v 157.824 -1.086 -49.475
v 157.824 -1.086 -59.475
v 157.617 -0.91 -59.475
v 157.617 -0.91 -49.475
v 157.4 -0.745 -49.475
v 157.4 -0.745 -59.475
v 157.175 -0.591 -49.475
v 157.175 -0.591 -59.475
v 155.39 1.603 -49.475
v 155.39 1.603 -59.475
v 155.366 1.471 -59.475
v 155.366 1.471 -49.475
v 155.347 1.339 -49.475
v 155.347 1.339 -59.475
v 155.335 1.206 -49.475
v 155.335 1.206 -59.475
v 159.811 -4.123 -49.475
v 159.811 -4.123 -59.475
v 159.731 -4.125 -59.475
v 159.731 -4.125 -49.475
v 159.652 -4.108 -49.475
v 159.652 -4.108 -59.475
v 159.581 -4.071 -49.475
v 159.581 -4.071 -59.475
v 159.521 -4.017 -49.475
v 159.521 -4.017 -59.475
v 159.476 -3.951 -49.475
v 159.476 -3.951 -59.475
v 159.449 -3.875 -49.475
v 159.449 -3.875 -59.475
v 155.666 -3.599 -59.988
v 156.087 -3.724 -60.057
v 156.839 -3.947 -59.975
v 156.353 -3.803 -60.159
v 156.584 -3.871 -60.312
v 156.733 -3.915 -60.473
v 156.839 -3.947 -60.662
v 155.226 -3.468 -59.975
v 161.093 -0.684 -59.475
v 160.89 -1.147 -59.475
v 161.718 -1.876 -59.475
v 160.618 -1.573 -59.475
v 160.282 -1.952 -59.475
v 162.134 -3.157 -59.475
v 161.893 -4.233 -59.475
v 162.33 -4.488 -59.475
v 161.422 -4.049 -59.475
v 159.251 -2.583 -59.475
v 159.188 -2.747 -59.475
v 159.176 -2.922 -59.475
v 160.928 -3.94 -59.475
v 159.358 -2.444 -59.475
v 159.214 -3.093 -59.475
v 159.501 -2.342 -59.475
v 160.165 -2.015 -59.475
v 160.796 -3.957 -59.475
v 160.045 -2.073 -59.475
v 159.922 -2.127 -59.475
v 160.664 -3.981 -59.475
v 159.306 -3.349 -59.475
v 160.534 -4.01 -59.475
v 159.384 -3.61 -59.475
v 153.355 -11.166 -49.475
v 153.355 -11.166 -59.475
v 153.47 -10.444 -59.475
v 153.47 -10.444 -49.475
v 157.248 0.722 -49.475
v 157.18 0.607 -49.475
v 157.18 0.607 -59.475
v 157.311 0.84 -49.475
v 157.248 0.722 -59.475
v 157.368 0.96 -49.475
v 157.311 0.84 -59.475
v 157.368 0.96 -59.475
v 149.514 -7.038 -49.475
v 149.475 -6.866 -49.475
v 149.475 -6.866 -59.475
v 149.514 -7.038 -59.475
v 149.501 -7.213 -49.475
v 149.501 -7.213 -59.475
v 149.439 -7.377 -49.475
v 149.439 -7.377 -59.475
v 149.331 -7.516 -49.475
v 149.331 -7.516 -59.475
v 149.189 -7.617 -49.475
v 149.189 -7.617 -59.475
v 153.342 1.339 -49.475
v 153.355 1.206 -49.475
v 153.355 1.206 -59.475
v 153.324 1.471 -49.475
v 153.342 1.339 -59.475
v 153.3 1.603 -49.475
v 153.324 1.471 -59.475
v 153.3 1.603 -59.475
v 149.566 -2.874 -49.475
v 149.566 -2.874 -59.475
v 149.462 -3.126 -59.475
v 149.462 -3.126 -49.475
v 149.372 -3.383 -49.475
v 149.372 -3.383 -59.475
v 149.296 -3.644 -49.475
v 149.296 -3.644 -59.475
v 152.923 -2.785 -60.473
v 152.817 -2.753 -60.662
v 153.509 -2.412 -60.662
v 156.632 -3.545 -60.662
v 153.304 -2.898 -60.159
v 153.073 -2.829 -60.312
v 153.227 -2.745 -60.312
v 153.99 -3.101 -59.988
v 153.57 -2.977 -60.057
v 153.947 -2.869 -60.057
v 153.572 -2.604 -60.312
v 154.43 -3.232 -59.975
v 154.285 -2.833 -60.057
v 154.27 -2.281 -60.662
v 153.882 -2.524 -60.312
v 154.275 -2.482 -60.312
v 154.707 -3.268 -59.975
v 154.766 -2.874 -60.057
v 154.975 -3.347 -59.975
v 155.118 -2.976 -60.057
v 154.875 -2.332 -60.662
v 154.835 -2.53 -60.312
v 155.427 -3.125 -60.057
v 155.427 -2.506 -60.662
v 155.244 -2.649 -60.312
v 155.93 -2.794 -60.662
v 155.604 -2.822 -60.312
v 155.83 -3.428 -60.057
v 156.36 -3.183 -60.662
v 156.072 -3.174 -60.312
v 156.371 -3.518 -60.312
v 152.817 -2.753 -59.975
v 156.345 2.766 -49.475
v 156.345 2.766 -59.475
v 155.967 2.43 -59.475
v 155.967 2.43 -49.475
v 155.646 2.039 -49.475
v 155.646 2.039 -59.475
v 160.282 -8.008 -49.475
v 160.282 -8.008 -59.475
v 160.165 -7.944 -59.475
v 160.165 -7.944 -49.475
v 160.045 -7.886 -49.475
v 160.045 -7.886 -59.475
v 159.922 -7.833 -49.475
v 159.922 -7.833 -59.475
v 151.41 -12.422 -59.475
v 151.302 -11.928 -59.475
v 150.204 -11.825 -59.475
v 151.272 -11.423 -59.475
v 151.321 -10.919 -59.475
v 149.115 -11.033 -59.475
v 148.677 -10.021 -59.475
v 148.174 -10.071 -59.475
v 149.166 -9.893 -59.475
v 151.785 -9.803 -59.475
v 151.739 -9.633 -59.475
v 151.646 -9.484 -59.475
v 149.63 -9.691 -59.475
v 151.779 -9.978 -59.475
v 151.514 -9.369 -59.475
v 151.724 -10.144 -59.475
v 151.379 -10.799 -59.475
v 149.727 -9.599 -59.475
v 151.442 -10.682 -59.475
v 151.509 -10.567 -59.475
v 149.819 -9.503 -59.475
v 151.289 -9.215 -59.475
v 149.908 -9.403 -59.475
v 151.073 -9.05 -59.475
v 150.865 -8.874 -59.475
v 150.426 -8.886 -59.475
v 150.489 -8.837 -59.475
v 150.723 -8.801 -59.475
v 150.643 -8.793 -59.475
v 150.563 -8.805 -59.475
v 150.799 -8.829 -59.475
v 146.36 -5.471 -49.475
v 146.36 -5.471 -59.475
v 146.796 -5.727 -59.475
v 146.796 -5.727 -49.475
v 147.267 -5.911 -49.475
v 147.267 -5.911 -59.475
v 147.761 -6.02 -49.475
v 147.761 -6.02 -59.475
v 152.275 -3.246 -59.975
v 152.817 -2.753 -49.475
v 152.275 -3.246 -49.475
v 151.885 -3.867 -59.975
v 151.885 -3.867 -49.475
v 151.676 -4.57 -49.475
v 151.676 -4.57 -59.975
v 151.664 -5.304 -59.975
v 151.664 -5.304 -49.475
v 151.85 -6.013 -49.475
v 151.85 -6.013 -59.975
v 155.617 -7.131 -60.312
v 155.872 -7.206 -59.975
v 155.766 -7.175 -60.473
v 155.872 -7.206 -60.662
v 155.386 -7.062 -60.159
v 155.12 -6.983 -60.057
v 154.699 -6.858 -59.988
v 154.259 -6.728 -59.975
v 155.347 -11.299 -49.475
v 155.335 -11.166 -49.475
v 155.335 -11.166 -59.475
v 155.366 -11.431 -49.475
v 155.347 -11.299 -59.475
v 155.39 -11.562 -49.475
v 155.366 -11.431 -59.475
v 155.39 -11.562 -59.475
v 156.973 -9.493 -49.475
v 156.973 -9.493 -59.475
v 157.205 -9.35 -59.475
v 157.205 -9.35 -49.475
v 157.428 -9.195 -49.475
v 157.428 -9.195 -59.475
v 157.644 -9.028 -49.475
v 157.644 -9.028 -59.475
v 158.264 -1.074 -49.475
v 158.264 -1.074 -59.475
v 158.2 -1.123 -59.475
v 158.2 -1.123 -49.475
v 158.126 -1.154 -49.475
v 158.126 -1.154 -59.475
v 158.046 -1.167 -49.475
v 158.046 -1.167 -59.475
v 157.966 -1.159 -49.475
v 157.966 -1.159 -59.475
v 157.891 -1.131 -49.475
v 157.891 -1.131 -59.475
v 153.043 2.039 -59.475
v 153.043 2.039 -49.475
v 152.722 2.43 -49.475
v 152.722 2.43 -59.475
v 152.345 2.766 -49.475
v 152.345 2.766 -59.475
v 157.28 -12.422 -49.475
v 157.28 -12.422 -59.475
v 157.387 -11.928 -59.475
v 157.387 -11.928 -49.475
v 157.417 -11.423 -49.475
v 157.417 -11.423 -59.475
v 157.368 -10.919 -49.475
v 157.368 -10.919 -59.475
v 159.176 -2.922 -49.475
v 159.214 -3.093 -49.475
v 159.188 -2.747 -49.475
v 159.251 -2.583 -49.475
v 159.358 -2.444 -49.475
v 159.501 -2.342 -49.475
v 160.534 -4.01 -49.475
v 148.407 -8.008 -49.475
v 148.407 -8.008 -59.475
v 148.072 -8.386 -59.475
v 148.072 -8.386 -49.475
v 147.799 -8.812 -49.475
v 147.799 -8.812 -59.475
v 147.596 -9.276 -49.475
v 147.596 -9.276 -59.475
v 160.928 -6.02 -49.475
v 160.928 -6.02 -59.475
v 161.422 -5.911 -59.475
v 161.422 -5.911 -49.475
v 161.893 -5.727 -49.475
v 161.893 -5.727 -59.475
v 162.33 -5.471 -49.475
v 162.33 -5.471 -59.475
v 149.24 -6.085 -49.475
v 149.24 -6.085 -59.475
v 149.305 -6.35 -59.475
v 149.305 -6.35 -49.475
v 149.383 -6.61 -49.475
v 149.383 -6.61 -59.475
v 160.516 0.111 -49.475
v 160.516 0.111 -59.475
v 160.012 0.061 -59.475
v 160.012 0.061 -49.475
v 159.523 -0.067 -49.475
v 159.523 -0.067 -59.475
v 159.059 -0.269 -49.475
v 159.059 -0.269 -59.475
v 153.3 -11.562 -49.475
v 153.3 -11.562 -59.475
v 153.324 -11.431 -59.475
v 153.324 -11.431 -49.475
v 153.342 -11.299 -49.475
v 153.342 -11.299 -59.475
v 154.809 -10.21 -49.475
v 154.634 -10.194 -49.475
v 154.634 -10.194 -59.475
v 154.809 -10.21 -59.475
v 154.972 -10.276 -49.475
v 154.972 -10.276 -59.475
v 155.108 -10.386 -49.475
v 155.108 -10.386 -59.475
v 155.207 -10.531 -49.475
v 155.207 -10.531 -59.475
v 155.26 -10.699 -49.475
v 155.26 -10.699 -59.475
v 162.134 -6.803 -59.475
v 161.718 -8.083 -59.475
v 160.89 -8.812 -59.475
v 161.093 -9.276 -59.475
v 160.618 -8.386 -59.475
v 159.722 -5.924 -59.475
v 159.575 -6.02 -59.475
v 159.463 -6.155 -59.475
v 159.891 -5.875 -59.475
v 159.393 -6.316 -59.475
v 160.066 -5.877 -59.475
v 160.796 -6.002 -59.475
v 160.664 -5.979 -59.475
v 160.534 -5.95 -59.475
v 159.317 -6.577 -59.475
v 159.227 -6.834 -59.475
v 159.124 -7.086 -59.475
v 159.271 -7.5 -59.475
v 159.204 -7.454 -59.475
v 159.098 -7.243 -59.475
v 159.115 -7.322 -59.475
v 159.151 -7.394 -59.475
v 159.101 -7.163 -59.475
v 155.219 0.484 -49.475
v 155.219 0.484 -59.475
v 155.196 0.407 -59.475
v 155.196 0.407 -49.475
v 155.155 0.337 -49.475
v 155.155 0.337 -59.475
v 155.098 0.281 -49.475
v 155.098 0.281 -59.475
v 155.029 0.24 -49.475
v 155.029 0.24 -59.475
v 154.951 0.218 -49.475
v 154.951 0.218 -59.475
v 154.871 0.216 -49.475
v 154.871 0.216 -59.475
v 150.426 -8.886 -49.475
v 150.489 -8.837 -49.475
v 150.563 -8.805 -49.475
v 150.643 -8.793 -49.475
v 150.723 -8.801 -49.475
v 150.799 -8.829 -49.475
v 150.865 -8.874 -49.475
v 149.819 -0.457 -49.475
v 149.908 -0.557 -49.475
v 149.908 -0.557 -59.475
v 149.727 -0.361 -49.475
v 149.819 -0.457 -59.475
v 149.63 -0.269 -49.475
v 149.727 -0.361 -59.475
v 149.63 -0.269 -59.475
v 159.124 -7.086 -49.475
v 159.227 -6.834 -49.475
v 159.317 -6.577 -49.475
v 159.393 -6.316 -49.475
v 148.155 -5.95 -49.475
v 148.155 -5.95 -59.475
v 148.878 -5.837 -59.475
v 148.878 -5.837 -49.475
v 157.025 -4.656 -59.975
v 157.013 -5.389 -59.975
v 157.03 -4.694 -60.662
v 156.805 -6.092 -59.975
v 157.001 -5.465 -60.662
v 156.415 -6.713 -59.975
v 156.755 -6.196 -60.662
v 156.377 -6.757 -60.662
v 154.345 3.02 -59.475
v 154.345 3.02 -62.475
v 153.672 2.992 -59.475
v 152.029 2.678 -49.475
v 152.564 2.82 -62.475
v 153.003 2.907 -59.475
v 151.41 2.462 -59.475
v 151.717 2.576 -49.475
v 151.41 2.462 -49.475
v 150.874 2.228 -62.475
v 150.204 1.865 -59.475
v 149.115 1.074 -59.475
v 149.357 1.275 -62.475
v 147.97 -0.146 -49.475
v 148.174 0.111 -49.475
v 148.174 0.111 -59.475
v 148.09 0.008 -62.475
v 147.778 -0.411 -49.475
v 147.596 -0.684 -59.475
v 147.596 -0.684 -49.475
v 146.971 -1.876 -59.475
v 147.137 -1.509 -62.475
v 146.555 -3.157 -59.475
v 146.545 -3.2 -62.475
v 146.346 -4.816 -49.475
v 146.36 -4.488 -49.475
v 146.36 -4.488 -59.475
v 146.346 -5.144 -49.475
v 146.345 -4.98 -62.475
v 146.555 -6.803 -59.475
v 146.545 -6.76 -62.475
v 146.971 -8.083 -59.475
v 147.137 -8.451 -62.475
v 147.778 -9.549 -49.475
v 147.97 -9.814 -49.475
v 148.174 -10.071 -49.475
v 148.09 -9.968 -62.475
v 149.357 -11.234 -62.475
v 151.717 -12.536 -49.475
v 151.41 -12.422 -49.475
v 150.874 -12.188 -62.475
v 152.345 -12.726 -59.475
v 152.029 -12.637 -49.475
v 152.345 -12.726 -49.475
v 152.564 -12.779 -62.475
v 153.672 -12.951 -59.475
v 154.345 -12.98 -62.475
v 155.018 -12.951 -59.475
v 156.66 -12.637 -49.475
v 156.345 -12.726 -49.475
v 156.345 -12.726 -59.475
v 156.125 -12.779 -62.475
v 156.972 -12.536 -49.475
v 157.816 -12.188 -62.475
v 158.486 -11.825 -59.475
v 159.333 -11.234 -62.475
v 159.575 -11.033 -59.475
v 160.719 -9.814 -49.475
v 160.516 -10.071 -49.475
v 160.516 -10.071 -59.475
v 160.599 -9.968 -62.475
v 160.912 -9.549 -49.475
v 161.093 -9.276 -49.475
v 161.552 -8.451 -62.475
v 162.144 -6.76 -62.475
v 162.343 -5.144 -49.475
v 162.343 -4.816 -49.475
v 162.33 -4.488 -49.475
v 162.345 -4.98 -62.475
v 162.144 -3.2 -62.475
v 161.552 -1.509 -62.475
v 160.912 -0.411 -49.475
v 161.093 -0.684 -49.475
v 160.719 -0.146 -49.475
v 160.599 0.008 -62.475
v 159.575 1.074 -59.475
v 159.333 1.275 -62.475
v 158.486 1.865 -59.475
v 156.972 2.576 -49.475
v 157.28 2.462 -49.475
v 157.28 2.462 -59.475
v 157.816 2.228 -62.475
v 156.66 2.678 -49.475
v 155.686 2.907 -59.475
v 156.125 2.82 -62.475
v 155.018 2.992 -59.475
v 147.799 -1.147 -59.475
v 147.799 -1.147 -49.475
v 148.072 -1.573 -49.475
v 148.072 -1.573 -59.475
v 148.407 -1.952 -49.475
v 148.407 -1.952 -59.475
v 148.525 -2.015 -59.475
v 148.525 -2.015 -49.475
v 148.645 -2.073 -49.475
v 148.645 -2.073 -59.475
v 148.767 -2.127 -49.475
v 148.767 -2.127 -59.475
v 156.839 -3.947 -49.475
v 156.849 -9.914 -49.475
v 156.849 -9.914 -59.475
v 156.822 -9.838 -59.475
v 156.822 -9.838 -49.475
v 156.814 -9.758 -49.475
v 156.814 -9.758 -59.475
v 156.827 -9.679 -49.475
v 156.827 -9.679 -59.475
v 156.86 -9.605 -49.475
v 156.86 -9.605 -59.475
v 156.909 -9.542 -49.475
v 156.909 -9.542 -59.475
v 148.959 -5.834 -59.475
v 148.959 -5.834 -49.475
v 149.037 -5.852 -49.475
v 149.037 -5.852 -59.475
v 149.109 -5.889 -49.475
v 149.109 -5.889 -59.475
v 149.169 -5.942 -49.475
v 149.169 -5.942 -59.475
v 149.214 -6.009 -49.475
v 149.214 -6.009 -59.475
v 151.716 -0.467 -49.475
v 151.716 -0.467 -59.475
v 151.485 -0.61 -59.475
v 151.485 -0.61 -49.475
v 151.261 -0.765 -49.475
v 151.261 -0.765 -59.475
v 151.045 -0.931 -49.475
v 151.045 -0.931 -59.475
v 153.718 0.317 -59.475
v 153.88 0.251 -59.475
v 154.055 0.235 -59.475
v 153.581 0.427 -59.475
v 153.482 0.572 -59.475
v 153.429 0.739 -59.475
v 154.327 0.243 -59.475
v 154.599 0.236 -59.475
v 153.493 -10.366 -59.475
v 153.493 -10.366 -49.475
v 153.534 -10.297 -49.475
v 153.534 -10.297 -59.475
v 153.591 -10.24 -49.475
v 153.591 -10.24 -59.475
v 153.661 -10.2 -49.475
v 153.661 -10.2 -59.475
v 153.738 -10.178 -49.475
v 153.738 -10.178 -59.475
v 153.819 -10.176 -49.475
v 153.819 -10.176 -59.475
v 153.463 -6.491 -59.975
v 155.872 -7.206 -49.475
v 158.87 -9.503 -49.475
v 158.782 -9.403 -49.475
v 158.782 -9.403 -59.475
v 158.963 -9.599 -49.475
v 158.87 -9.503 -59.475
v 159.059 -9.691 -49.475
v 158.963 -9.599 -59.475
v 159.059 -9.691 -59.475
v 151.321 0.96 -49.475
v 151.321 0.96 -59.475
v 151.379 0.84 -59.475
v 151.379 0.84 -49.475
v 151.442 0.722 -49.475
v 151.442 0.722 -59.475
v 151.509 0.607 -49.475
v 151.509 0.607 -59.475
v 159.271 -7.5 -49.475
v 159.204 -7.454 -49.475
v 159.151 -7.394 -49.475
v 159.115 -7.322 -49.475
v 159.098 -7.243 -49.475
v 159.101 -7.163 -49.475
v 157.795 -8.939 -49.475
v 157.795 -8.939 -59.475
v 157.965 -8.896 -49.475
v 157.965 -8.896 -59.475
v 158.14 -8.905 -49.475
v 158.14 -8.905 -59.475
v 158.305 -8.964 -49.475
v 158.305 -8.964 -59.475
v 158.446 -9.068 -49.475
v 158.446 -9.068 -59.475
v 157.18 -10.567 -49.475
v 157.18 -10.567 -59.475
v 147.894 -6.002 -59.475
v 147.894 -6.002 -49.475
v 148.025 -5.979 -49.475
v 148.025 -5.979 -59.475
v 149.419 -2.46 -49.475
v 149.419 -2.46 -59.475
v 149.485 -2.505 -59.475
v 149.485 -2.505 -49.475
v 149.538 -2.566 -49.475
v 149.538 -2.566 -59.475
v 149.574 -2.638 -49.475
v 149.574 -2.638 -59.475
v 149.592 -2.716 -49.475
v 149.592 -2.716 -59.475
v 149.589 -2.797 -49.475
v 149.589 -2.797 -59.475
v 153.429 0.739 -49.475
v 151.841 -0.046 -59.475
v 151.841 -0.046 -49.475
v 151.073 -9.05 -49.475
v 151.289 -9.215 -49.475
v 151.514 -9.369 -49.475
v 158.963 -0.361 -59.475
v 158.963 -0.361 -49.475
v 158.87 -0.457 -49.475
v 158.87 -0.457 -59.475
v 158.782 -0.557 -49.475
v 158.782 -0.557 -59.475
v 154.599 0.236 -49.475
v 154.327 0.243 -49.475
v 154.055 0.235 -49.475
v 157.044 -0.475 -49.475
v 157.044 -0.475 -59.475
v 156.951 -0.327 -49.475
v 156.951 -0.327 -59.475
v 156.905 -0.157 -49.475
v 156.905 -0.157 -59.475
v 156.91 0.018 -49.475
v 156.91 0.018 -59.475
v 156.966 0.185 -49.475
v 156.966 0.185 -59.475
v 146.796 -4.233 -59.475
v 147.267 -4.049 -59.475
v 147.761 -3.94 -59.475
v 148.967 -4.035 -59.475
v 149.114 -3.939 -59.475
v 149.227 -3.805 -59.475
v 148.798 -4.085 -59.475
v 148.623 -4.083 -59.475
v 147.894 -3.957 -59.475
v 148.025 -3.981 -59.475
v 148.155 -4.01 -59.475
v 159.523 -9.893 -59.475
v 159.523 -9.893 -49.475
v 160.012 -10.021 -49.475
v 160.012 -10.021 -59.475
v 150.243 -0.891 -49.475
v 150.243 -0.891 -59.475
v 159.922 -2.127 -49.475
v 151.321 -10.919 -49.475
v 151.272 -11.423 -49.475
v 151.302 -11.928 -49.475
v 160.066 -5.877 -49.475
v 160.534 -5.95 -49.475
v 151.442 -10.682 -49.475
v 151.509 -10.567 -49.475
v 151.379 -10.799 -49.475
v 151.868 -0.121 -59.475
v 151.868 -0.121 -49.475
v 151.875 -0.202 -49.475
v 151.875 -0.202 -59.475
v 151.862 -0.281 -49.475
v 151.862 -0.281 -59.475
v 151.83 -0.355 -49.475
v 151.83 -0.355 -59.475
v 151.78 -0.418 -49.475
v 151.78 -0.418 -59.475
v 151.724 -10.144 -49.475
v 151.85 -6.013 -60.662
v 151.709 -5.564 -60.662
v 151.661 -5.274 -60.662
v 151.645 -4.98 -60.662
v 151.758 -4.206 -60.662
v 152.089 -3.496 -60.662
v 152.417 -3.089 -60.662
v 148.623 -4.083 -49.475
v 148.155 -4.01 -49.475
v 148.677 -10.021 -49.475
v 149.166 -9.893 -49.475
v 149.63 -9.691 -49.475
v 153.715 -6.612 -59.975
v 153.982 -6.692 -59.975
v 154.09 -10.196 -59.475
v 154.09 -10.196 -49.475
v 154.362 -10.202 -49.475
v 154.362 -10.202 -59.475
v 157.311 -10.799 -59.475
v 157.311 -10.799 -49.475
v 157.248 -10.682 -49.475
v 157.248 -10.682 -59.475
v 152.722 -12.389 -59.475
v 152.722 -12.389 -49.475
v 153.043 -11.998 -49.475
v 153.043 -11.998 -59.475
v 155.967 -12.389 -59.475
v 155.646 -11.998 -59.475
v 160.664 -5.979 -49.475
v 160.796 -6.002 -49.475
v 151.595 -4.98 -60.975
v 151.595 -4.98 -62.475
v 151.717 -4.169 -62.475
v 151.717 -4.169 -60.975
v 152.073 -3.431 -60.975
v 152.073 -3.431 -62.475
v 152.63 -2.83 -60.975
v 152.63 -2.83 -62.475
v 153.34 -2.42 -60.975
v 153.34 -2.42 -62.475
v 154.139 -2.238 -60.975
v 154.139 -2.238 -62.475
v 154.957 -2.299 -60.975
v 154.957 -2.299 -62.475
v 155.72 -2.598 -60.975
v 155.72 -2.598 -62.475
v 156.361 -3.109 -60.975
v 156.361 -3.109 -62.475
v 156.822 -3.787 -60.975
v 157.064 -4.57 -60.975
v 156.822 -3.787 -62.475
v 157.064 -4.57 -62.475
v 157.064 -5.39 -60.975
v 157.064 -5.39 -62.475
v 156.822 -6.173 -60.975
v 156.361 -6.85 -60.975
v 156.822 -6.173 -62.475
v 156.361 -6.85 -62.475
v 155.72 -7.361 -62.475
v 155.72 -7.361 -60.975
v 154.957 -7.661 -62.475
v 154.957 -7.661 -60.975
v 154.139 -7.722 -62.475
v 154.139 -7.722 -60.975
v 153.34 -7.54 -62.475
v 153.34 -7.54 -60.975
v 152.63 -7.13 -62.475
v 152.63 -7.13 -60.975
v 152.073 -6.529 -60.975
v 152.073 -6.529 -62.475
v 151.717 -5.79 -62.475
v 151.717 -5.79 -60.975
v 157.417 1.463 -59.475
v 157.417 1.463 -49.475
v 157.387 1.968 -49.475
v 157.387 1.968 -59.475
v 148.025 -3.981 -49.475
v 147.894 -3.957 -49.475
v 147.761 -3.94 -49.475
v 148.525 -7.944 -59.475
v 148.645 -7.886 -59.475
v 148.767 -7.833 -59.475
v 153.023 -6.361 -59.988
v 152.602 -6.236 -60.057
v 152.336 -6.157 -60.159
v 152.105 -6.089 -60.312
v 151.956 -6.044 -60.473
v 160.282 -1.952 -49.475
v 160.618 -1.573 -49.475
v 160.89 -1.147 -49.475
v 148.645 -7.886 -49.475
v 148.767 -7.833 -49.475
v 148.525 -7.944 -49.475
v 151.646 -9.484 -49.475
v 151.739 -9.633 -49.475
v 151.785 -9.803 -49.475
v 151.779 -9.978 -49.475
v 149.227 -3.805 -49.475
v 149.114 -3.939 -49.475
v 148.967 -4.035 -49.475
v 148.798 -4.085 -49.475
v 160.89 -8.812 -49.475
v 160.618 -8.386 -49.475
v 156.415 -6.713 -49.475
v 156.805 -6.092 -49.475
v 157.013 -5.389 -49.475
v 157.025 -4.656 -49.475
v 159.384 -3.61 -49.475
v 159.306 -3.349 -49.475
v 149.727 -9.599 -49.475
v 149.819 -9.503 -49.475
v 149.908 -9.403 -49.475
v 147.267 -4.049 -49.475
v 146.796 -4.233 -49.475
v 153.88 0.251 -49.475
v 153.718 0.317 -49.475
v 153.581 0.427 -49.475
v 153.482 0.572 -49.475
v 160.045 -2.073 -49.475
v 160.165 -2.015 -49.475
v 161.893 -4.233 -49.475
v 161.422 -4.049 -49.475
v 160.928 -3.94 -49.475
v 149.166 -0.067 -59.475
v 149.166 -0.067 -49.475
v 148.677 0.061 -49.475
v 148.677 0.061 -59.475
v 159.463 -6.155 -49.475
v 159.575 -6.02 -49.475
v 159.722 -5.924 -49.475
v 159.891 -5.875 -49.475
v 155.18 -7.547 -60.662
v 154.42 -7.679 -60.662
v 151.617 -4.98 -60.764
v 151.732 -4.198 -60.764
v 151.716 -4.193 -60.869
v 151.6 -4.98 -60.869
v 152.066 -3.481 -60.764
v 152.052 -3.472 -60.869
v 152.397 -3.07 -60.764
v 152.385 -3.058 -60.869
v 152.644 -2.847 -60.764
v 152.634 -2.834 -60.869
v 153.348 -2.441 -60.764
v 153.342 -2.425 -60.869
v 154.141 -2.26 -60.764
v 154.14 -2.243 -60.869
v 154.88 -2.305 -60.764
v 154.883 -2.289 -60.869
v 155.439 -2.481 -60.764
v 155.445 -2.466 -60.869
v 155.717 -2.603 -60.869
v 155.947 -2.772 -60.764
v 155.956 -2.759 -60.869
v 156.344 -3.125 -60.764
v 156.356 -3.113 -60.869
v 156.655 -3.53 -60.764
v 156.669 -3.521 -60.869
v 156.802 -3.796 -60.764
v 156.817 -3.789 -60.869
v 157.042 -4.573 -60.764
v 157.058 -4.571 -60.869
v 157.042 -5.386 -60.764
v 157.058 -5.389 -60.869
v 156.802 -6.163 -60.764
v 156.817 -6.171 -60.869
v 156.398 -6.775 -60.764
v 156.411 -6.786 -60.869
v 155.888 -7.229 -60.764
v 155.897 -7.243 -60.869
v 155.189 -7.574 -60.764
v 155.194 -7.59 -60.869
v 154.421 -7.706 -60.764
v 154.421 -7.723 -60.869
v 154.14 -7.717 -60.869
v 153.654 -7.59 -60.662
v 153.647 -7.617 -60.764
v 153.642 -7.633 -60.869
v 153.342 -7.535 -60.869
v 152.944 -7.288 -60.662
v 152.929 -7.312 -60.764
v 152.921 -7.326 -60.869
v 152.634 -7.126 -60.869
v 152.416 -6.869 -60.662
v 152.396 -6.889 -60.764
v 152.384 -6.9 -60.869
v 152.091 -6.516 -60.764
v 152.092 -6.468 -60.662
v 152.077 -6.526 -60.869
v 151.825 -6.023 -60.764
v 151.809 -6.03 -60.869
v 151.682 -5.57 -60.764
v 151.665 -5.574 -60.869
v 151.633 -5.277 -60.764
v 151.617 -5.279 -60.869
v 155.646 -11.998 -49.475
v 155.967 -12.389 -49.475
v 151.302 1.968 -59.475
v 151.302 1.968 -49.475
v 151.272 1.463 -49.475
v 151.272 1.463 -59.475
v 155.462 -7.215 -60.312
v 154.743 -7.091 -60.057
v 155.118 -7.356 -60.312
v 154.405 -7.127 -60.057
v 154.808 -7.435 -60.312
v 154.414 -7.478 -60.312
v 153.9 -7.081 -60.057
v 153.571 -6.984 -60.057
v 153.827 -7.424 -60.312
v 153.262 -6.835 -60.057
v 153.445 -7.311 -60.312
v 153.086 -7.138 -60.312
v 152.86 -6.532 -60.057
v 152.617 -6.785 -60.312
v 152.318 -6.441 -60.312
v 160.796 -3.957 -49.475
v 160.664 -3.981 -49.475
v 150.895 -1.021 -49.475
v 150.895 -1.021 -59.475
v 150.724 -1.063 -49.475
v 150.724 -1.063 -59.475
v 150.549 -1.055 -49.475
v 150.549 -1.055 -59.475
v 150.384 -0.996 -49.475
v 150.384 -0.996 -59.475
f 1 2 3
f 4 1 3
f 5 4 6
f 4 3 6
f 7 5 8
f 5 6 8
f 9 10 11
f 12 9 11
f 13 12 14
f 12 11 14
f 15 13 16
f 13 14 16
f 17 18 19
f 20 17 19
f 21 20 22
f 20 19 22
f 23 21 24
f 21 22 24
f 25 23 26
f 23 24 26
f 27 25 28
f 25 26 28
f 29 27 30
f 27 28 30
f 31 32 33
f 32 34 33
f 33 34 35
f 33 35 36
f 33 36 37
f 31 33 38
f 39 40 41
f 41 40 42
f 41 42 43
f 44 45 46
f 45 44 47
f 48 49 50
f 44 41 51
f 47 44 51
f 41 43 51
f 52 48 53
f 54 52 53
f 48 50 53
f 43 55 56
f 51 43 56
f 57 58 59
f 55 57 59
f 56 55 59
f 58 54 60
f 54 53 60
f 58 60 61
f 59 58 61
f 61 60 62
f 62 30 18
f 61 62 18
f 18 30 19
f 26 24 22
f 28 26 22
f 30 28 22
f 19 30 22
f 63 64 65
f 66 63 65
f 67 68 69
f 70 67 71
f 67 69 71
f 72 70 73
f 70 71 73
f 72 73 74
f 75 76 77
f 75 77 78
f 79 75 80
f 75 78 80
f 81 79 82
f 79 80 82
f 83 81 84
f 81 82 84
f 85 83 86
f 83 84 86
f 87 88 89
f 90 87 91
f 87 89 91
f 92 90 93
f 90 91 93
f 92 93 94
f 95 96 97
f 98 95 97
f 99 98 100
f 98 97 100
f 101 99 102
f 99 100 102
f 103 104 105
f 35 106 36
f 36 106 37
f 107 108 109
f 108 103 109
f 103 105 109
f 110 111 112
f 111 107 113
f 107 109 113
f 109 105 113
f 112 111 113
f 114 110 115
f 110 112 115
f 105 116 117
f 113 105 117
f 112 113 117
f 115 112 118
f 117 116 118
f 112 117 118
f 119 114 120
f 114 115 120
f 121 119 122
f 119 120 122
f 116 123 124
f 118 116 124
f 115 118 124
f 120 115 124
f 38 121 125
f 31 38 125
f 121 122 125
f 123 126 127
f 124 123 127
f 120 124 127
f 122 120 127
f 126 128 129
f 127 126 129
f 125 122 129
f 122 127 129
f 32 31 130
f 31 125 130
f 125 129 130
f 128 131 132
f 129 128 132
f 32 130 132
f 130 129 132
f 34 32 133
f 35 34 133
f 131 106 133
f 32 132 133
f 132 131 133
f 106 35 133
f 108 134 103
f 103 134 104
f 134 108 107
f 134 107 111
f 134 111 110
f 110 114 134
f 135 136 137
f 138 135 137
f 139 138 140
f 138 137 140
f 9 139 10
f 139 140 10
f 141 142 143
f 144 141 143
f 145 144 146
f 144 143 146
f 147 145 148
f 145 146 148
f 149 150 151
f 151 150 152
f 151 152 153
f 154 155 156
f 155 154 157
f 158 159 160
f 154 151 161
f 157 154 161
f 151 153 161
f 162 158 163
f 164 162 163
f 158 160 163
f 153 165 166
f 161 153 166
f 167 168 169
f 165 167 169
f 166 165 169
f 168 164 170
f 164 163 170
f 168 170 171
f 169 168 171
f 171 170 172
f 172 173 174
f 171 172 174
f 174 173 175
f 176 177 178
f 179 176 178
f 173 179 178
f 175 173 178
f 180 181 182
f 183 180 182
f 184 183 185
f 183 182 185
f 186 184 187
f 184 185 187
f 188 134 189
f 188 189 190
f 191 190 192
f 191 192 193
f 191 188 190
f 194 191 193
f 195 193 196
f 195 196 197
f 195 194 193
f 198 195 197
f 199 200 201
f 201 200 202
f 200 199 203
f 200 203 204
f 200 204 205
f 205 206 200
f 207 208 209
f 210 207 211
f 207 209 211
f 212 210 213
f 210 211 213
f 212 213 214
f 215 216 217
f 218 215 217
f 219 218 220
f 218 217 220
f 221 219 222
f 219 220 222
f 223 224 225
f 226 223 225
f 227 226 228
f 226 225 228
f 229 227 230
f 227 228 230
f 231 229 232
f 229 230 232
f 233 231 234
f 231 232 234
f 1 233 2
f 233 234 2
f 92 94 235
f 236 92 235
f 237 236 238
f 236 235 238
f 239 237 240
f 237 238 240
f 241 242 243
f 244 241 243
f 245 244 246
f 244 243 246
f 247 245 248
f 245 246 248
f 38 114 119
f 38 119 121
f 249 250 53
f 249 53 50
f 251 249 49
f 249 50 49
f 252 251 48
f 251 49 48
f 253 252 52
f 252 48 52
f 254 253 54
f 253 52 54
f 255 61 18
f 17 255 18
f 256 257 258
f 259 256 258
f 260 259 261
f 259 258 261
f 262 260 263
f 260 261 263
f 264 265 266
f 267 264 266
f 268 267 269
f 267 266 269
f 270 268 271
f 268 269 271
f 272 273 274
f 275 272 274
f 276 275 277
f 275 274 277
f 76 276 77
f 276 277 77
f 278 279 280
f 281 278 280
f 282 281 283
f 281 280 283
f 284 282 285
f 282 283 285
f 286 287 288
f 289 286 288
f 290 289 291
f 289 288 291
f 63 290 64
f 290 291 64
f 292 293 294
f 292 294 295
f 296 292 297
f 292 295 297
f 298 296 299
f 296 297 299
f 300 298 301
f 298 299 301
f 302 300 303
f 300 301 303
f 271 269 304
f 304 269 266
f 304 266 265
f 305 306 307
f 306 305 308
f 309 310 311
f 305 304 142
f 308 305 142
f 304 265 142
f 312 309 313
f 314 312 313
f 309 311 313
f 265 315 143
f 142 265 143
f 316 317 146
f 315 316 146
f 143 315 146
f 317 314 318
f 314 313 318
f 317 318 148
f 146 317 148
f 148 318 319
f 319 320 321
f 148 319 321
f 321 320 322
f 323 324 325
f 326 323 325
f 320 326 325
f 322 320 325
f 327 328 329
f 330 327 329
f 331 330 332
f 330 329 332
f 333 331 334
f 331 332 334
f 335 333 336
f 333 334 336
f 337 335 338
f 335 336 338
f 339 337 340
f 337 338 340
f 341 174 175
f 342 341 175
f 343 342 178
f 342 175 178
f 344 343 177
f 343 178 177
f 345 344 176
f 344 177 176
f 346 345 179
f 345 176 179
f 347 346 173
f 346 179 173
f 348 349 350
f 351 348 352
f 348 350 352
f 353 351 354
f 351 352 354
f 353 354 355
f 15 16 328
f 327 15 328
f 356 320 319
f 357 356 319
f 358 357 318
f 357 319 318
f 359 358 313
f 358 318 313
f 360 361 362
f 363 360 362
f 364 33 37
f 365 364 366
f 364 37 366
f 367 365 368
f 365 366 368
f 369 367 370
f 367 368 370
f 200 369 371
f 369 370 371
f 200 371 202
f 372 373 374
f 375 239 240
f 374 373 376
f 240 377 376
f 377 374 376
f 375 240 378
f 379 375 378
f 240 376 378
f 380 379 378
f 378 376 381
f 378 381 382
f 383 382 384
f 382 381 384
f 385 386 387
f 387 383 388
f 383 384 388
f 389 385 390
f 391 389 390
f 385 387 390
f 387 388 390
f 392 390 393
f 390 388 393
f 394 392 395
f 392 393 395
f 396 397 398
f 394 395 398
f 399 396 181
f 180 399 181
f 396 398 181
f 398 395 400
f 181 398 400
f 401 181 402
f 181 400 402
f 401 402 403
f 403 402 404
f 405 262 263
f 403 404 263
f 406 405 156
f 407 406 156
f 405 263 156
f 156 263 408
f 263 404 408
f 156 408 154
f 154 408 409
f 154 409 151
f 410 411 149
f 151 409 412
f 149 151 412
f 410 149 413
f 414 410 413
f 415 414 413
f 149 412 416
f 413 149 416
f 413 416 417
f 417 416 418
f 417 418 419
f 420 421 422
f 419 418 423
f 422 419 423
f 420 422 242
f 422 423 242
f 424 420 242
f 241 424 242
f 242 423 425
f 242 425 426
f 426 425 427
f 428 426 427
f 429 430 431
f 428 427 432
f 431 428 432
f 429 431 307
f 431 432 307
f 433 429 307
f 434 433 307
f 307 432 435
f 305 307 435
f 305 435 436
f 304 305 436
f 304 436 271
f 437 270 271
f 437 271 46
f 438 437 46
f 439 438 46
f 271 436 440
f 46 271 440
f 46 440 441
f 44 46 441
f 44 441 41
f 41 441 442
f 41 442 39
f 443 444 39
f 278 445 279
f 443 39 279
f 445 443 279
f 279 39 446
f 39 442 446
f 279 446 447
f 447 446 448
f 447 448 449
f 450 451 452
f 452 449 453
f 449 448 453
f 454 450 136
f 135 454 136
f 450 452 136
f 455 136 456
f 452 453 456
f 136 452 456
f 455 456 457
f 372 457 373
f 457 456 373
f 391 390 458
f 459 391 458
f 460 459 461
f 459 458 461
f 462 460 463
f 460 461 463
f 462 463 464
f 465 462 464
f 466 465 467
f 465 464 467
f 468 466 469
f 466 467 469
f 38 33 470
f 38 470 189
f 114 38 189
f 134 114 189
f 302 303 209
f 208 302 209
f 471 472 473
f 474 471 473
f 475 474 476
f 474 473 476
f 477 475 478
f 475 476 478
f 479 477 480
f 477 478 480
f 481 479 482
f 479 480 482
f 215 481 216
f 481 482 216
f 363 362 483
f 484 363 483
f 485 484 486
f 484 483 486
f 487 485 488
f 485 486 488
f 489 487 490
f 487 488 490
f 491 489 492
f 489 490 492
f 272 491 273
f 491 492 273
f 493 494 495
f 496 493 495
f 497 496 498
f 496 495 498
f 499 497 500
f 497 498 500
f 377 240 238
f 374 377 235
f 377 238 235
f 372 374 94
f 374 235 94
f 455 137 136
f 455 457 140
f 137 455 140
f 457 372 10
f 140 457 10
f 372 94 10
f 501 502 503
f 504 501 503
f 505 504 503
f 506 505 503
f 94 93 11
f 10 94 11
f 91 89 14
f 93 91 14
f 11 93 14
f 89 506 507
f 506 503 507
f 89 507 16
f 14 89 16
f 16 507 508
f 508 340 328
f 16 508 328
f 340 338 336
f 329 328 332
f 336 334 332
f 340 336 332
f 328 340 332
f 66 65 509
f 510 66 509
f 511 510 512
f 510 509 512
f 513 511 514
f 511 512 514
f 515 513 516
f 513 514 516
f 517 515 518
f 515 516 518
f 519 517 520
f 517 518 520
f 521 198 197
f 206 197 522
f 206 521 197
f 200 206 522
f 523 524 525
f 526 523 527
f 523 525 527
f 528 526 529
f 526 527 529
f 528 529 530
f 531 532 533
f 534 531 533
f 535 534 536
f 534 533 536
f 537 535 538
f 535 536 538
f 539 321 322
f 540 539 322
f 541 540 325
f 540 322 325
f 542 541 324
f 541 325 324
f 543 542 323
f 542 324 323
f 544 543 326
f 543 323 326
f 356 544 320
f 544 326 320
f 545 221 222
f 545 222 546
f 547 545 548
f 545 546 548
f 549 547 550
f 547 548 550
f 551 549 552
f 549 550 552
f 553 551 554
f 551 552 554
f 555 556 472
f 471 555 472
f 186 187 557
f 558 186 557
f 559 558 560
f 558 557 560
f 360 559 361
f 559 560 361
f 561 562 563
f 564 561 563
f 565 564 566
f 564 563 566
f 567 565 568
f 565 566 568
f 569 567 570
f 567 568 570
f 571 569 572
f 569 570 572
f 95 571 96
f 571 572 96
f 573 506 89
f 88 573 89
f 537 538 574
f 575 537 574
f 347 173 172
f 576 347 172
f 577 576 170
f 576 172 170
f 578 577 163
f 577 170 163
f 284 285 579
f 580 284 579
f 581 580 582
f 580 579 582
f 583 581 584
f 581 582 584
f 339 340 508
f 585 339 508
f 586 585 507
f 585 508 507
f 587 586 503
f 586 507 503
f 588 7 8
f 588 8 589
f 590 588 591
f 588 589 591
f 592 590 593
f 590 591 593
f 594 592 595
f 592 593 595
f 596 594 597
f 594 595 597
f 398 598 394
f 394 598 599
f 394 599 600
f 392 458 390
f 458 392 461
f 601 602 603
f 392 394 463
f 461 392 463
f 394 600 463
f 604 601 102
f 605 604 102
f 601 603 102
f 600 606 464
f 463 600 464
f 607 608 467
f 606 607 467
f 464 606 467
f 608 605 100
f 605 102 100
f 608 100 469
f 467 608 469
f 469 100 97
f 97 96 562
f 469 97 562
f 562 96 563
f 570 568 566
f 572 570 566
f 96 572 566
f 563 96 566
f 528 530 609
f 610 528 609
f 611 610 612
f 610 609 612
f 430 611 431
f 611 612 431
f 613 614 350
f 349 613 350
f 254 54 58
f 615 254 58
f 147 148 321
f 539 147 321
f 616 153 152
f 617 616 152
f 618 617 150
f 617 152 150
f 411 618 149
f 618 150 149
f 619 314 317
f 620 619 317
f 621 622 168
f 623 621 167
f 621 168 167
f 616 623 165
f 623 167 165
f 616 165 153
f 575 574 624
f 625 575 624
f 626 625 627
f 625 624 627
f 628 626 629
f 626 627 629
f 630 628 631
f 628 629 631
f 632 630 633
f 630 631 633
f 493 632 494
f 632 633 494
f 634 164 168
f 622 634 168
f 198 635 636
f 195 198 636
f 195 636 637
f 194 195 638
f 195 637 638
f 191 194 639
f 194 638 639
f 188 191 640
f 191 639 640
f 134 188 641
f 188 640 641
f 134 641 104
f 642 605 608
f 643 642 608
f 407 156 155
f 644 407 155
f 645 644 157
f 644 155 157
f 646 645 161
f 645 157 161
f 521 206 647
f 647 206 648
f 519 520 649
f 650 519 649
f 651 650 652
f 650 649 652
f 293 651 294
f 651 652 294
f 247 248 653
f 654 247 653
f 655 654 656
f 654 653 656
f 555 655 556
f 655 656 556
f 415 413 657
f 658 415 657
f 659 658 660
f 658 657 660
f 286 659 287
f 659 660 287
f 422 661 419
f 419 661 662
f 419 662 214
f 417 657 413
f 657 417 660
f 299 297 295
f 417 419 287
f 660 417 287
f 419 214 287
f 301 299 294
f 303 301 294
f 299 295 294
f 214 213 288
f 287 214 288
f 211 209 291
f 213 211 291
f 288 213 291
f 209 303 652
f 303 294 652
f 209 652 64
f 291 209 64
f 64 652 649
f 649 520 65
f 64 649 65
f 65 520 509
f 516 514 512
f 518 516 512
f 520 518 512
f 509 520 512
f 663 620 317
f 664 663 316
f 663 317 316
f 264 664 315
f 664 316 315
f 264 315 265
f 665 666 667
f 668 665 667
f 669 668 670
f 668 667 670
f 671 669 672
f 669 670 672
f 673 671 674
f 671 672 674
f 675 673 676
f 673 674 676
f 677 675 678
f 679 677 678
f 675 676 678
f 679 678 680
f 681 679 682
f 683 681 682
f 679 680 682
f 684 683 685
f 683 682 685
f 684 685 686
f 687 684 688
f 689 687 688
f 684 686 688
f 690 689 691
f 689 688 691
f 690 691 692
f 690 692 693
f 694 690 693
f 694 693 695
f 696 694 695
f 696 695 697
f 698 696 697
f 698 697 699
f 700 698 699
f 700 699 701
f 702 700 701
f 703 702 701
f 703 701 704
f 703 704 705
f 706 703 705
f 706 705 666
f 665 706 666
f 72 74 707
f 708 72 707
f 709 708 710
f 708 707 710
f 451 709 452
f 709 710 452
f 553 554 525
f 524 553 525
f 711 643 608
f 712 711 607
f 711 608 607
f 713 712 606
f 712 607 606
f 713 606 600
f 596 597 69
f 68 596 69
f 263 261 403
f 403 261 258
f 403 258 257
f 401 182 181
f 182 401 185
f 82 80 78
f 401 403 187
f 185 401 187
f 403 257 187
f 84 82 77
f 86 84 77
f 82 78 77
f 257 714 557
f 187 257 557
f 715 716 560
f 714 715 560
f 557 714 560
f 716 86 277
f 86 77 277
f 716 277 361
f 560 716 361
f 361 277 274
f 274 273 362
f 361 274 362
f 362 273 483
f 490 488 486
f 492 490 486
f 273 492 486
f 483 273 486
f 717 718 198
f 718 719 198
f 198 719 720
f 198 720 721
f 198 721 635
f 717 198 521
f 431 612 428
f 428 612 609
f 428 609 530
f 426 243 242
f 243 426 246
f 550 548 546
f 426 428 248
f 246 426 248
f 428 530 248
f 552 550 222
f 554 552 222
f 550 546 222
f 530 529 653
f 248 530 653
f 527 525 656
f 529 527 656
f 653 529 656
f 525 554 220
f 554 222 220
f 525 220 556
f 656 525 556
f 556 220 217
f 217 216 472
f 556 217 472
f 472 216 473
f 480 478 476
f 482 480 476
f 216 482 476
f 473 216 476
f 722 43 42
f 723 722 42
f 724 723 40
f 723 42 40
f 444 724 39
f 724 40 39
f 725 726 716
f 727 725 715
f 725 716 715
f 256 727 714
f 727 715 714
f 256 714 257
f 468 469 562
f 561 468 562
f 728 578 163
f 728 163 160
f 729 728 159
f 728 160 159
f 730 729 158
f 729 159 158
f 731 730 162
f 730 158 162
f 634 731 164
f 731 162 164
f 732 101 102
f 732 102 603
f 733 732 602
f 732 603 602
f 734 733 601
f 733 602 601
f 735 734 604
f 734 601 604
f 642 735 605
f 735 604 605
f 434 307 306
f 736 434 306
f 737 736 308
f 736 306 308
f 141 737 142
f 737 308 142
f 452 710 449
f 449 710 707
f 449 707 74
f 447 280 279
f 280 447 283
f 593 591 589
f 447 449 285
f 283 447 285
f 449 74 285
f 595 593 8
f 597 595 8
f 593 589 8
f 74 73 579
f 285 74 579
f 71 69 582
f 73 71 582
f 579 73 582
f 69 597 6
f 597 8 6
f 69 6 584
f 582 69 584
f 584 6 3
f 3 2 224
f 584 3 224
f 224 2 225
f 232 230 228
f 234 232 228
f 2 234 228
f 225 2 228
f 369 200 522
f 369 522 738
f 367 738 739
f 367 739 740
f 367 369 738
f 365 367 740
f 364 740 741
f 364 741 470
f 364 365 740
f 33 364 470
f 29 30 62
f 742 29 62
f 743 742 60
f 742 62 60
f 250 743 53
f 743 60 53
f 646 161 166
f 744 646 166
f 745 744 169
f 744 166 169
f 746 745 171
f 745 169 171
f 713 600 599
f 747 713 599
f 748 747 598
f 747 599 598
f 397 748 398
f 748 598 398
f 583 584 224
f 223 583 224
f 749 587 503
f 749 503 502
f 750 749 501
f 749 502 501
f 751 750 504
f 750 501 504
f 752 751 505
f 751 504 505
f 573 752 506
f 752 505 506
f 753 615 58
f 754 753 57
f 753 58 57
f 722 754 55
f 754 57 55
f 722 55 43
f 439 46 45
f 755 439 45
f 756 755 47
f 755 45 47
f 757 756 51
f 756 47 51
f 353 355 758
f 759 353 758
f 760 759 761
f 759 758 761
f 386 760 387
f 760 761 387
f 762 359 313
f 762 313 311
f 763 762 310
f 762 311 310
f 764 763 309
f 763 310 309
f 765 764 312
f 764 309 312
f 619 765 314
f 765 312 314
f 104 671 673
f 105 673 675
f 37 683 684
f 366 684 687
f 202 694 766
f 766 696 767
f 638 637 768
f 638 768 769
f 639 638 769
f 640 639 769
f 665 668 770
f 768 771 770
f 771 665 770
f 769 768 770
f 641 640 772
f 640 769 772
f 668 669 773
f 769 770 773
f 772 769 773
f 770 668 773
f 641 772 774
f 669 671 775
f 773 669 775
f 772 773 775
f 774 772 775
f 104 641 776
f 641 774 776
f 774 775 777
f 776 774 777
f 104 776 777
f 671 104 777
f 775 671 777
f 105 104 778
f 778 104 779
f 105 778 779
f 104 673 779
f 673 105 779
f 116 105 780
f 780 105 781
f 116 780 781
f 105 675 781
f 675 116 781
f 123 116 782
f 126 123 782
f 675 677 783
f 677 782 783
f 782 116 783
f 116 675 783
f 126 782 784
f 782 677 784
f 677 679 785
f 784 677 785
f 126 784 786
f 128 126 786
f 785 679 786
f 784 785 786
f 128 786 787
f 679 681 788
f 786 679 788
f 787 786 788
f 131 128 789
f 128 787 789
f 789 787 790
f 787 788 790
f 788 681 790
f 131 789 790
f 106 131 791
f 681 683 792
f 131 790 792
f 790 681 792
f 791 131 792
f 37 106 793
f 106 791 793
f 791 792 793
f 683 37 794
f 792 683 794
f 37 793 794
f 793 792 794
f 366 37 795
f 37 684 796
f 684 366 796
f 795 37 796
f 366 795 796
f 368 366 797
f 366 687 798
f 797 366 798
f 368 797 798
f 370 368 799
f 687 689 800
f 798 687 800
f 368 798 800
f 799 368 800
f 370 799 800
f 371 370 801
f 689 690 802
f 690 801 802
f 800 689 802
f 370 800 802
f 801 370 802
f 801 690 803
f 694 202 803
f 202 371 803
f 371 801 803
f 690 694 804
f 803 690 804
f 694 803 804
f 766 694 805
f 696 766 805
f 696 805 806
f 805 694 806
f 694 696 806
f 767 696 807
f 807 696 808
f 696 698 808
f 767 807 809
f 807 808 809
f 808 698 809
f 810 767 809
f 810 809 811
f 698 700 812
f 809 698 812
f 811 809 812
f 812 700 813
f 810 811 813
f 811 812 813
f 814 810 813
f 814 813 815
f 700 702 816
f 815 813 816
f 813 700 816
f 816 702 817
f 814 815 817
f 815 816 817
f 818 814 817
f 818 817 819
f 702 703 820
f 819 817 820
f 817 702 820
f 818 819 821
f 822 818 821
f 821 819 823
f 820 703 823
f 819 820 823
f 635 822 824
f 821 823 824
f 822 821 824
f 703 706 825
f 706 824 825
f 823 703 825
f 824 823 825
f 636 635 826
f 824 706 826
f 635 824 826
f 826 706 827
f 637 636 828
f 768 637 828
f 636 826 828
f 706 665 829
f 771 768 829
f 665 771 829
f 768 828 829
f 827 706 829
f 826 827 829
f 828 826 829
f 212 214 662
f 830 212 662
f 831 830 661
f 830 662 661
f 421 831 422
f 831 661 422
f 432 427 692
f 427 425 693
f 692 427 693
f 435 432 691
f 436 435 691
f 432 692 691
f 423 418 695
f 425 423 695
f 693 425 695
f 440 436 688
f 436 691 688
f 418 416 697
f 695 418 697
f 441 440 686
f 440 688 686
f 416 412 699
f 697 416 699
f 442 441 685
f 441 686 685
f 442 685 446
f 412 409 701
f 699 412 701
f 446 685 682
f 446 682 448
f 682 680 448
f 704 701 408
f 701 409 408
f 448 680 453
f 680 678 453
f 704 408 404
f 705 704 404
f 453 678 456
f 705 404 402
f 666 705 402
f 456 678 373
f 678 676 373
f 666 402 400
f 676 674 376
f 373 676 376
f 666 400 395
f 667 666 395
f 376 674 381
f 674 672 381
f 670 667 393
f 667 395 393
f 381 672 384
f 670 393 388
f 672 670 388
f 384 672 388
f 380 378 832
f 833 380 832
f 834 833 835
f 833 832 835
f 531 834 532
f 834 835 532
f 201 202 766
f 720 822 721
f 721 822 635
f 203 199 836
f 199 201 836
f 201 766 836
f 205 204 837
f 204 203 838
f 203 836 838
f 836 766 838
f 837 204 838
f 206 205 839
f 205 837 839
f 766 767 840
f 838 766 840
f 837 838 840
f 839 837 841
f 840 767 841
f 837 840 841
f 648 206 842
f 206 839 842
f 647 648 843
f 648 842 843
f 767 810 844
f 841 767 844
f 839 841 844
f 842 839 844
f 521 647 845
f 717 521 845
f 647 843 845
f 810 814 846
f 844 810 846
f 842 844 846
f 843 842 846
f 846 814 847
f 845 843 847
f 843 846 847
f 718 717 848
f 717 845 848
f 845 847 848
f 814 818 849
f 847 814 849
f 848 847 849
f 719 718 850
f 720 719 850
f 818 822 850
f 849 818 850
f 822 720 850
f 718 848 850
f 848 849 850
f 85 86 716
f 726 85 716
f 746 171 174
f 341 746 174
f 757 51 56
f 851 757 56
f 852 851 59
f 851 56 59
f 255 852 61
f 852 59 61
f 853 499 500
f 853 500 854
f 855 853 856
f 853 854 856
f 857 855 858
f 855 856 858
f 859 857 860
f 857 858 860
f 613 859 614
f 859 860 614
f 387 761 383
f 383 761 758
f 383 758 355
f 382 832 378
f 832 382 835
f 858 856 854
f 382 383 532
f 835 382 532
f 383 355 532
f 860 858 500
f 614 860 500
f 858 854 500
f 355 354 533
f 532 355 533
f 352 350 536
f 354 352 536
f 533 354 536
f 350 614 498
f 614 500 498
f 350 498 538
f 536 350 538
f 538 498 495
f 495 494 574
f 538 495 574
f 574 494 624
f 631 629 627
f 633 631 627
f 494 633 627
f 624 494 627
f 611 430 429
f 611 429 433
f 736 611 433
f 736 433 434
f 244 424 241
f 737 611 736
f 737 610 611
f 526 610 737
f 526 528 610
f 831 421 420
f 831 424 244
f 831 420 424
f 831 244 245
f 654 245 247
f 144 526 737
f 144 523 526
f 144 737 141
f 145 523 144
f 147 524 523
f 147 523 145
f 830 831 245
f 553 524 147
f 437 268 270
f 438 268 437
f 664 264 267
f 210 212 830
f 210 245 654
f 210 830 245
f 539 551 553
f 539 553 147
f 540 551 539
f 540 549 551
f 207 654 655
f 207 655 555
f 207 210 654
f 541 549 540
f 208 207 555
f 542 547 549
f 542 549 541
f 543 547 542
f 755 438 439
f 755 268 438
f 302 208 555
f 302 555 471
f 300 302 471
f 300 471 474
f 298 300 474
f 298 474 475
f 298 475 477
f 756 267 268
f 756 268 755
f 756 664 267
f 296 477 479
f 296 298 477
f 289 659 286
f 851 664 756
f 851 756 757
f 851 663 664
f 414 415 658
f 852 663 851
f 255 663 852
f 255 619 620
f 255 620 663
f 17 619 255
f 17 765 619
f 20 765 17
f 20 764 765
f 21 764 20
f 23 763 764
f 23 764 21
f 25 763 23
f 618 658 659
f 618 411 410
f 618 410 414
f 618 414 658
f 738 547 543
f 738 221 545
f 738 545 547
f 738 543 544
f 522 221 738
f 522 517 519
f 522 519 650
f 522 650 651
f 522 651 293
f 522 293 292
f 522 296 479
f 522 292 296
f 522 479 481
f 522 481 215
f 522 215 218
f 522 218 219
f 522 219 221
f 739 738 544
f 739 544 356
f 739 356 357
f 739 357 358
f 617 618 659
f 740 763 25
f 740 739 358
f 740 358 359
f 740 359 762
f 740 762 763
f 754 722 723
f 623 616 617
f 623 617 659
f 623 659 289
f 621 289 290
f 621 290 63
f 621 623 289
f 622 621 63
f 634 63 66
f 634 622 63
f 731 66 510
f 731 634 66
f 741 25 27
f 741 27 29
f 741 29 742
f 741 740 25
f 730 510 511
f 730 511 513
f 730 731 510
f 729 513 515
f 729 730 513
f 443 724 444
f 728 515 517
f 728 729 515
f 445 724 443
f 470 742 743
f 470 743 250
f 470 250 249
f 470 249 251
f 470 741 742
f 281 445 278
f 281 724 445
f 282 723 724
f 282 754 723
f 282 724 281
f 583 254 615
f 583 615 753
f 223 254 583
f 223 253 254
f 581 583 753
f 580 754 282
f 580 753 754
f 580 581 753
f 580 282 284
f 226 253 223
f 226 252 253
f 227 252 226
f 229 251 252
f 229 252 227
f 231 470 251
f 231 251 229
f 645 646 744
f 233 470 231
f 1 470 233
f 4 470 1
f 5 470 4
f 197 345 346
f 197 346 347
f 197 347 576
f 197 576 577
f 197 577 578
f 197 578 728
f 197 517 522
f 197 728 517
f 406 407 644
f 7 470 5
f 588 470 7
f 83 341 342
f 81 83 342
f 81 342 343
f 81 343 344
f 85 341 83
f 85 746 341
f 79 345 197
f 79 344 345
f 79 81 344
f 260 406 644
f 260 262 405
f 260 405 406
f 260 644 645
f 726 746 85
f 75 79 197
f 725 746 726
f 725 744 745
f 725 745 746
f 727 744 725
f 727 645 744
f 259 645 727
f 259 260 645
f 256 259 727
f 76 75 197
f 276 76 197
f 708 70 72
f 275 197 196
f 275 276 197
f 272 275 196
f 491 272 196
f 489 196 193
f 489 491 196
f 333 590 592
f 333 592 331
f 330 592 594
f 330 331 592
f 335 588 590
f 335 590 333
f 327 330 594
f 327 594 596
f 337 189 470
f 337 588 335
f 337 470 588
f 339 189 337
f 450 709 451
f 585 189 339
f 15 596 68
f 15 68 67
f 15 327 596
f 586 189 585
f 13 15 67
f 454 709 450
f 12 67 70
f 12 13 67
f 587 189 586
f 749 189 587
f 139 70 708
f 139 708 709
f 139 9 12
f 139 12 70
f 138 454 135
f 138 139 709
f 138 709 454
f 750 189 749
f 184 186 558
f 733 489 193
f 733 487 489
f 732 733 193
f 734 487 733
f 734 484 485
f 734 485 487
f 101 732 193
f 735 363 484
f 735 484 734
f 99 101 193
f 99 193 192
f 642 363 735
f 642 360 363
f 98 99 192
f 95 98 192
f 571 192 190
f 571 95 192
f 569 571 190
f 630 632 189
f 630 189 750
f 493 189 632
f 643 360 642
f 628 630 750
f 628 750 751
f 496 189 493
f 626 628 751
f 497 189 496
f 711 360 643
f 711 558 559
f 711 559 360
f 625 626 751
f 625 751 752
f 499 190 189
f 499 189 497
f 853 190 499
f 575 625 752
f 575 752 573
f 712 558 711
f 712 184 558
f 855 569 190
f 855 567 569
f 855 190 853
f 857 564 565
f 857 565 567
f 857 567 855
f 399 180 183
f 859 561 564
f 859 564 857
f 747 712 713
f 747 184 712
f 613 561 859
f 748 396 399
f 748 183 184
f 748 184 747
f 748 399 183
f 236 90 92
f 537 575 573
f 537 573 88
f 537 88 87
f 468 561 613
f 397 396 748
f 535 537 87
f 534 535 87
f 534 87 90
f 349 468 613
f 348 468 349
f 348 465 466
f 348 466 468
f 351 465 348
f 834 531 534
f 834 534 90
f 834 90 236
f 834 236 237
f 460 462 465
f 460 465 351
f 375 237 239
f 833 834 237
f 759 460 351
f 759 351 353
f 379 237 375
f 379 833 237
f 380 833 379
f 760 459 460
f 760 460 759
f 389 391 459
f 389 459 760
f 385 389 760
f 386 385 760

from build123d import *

# Parameters (mm, degrees)
ESBO_O1_R                = 8
RESSALTO_EXTRUS_O1_DEPTH = 13
CORTE_EXTRUS_O1_START    = -10
CORTE_EXTRUS_O1_DEPTH    = 10
PADR_OCIRCULAR1_COUNT    = 10
ESBO_O5_R                = 2.75
CORTE_EXTRUS_O2_DEPTH    = 2.5
FILETE1_R                = 1


with BuildPart() as part:
    # Esboço1 → Ressalto-extrusão1 (new body)
    with BuildSketch(Plane.XY.offset(-62.474592215)):
        with Locations(Location((154.344666384, -4.979841337, 0), (0, 0, 90))):
            Circle(ESBO_O1_R)
        with BuildLine():
            Line((156.839244486, -3.946845648), (152.817363907, -2.753331256))
            ThreePointArc((152.817363907, -2.753331256), (151.756235333, -4.211710693), (151.850088282, -6.012837026))
            Line((151.850088282, -6.012837026), (155.871968862, -7.206351418))
            ThreePointArc((155.871968862, -7.206351418), (156.933097439, -5.747971979), (156.839244486, -3.946845648))
        make_face(mode=Mode.SUBTRACT)
    extrude(amount=RESSALTO_EXTRUS_O1_DEPTH)

    # Esboço4 → Corte-extrusão1 (cut)
    with BuildSketch(Plane.XY.offset(-49.474592215).offset(CORTE_EXTRUS_O1_START)):
        with BuildLine():
            Line((155.259844023, -10.698578623), (155.334666384, -11.166126571))
            ThreePointArc((155.334666384, -11.166126571), (155.355864946, -11.365142474), (155.389666384, -11.562409225))
            ThreePointArc((155.389666384, -11.562409225), (155.798933371, -12.200119109), (156.344666384, -12.725808029))
            ThreePointArc((156.344666384, -12.725808029), (154.344666384, -12.979841337), (152.344666384, -12.725808029))
            ThreePointArc((152.344666384, -12.725808029), (152.890399398, -12.200119109), (153.299666384, -11.562409225))
            ThreePointArc((153.299666384, -11.562409225), (153.333467823, -11.365142474), (153.354666384, -11.166126571))
            Line((153.354666384, -11.166126571), (153.470297344, -10.443574954))
            ThreePointArc((153.470297344, -10.443574954), (153.591194582, -10.240482514), (153.8185158, -10.175769725))
            ThreePointArc((153.8185158, -10.175769725), (154.225958814, -10.20099205), (154.634127125, -10.194313384))
            ThreePointArc((154.634127125, -10.194313384), (155.043877847, -10.326217347), (155.259844023, -10.698578623))
        make_face()
    corte_extrus_o1 = extrude(amount=CORTE_EXTRUS_O1_DEPTH, mode=Mode.SUBTRACT)

    # PadrãoCircular1: Corte-extrusão1 ×10 about axis
    padr_ocircular1_axis = Axis((154.344666384, -4.979841337, 0), (0, 0, 1))
    for i in range(1, PADR_OCIRCULAR1_COUNT):
        add(corte_extrus_o1.rotate(padr_ocircular1_axis, i * 360 / PADR_OCIRCULAR1_COUNT), mode=Mode.SUBTRACT)

    # Esboço5 → Corte-extrusão2 (cut)
    with BuildSketch(Plane(origin=(0, 0, -62.474592215), x_dir=(-1, 0, 0), z_dir=(0, 0, -1))):
        with Locations((-154.344666384, -4.979841337)):
            Circle(ESBO_O5_R)
    extrude(amount=-CORTE_EXTRUS_O2_DEPTH, mode=Mode.SUBTRACT)

    # Filete1
    # the kernel refuses this fillet: 1 mm, written as the material it adds along each edge
    with BuildSketch(Plane(origin=(154.344666384, -4.979841337, -59.974592215), x_dir=(-1, 0, 0), z_dir=(0, -1, 0))) as filete1_piece_1_section:
        with BuildLine():
            CenterArc((2.75 - FILETE1_R, FILETE1_R), FILETE1_R, 270, 90)
            Line((2.75 - FILETE1_R, 0), (2.75, 0))
            Line((2.75, 0), (2.75, FILETE1_R))
        make_face()
    filete1_piece_1 = revolve(axis=Axis((154.344666384, -4.979841337, -59.974592215), (0, 0, -1)), mode=Mode.PRIVATE)
    filete1_piece_1 = filete1_piece_1 - Plane(origin=(154.344666389, -4.979841339, -60.815647373), x_dir=(-0.5656675853449286, 0.8246333627073538, 0), z_dir=(0, 0, -1)) * Cylinder(2.700000004, 12, mode=Mode.PRIVATE)
    add(filete1_piece_1)
    with BuildSketch(Plane(origin=(154.344666384, -4.979841337, -59.974592215), x_dir=(-1, 0, 0), z_dir=(0, -1, 0))) as filete1_piece_2_section:
        with BuildLine():
            CenterArc((2.75 - FILETE1_R, FILETE1_R), FILETE1_R, 270, 90)
            Line((2.75 - FILETE1_R, 0), (2.75, 0))
            Line((2.75, 0), (2.75, FILETE1_R))
        make_face()
    filete1_piece_2 = revolve(axis=Axis((154.344666384, -4.979841337, -59.974592215), (0, 0, -1)), mode=Mode.PRIVATE)
    filete1_piece_2 = split(filete1_piece_2, bisect_by=Plane(origin=(154.828304199, -3.350088453, -60.157362132), z_dir=(0.28449283065041153, 0.9586781677437514, 0)), keep=Keep.TOP, mode=Mode.PRIVATE)
    add(filete1_piece_2)
    with BuildSketch(Plane(origin=(154.344666384, -4.979841337, -59.974592215), x_dir=(-1, 0, 0), z_dir=(0, -1, 0))) as filete1_piece_3_section:
        with BuildLine():
            CenterArc((2.75 - FILETE1_R, FILETE1_R), FILETE1_R, 270, 90)
            Line((2.75 - FILETE1_R, 0), (2.75, 0))
            Line((2.75, 0), (2.75, FILETE1_R))
        make_face()
    filete1_piece_3 = revolve(axis=Axis((154.344666384, -4.979841337, -59.974592215), (0, 0, -1)), mode=Mode.PRIVATE)
    filete1_piece_3 = split(filete1_piece_3, bisect_by=Plane(origin=(152.118883506, -6.092603434, -60.089217232), z_dir=(-0.284492830650411, -0.9586781677437516, 0)), keep=Keep.TOP, mode=Mode.PRIVATE)
    add(filete1_piece_3)


solid = part.part
